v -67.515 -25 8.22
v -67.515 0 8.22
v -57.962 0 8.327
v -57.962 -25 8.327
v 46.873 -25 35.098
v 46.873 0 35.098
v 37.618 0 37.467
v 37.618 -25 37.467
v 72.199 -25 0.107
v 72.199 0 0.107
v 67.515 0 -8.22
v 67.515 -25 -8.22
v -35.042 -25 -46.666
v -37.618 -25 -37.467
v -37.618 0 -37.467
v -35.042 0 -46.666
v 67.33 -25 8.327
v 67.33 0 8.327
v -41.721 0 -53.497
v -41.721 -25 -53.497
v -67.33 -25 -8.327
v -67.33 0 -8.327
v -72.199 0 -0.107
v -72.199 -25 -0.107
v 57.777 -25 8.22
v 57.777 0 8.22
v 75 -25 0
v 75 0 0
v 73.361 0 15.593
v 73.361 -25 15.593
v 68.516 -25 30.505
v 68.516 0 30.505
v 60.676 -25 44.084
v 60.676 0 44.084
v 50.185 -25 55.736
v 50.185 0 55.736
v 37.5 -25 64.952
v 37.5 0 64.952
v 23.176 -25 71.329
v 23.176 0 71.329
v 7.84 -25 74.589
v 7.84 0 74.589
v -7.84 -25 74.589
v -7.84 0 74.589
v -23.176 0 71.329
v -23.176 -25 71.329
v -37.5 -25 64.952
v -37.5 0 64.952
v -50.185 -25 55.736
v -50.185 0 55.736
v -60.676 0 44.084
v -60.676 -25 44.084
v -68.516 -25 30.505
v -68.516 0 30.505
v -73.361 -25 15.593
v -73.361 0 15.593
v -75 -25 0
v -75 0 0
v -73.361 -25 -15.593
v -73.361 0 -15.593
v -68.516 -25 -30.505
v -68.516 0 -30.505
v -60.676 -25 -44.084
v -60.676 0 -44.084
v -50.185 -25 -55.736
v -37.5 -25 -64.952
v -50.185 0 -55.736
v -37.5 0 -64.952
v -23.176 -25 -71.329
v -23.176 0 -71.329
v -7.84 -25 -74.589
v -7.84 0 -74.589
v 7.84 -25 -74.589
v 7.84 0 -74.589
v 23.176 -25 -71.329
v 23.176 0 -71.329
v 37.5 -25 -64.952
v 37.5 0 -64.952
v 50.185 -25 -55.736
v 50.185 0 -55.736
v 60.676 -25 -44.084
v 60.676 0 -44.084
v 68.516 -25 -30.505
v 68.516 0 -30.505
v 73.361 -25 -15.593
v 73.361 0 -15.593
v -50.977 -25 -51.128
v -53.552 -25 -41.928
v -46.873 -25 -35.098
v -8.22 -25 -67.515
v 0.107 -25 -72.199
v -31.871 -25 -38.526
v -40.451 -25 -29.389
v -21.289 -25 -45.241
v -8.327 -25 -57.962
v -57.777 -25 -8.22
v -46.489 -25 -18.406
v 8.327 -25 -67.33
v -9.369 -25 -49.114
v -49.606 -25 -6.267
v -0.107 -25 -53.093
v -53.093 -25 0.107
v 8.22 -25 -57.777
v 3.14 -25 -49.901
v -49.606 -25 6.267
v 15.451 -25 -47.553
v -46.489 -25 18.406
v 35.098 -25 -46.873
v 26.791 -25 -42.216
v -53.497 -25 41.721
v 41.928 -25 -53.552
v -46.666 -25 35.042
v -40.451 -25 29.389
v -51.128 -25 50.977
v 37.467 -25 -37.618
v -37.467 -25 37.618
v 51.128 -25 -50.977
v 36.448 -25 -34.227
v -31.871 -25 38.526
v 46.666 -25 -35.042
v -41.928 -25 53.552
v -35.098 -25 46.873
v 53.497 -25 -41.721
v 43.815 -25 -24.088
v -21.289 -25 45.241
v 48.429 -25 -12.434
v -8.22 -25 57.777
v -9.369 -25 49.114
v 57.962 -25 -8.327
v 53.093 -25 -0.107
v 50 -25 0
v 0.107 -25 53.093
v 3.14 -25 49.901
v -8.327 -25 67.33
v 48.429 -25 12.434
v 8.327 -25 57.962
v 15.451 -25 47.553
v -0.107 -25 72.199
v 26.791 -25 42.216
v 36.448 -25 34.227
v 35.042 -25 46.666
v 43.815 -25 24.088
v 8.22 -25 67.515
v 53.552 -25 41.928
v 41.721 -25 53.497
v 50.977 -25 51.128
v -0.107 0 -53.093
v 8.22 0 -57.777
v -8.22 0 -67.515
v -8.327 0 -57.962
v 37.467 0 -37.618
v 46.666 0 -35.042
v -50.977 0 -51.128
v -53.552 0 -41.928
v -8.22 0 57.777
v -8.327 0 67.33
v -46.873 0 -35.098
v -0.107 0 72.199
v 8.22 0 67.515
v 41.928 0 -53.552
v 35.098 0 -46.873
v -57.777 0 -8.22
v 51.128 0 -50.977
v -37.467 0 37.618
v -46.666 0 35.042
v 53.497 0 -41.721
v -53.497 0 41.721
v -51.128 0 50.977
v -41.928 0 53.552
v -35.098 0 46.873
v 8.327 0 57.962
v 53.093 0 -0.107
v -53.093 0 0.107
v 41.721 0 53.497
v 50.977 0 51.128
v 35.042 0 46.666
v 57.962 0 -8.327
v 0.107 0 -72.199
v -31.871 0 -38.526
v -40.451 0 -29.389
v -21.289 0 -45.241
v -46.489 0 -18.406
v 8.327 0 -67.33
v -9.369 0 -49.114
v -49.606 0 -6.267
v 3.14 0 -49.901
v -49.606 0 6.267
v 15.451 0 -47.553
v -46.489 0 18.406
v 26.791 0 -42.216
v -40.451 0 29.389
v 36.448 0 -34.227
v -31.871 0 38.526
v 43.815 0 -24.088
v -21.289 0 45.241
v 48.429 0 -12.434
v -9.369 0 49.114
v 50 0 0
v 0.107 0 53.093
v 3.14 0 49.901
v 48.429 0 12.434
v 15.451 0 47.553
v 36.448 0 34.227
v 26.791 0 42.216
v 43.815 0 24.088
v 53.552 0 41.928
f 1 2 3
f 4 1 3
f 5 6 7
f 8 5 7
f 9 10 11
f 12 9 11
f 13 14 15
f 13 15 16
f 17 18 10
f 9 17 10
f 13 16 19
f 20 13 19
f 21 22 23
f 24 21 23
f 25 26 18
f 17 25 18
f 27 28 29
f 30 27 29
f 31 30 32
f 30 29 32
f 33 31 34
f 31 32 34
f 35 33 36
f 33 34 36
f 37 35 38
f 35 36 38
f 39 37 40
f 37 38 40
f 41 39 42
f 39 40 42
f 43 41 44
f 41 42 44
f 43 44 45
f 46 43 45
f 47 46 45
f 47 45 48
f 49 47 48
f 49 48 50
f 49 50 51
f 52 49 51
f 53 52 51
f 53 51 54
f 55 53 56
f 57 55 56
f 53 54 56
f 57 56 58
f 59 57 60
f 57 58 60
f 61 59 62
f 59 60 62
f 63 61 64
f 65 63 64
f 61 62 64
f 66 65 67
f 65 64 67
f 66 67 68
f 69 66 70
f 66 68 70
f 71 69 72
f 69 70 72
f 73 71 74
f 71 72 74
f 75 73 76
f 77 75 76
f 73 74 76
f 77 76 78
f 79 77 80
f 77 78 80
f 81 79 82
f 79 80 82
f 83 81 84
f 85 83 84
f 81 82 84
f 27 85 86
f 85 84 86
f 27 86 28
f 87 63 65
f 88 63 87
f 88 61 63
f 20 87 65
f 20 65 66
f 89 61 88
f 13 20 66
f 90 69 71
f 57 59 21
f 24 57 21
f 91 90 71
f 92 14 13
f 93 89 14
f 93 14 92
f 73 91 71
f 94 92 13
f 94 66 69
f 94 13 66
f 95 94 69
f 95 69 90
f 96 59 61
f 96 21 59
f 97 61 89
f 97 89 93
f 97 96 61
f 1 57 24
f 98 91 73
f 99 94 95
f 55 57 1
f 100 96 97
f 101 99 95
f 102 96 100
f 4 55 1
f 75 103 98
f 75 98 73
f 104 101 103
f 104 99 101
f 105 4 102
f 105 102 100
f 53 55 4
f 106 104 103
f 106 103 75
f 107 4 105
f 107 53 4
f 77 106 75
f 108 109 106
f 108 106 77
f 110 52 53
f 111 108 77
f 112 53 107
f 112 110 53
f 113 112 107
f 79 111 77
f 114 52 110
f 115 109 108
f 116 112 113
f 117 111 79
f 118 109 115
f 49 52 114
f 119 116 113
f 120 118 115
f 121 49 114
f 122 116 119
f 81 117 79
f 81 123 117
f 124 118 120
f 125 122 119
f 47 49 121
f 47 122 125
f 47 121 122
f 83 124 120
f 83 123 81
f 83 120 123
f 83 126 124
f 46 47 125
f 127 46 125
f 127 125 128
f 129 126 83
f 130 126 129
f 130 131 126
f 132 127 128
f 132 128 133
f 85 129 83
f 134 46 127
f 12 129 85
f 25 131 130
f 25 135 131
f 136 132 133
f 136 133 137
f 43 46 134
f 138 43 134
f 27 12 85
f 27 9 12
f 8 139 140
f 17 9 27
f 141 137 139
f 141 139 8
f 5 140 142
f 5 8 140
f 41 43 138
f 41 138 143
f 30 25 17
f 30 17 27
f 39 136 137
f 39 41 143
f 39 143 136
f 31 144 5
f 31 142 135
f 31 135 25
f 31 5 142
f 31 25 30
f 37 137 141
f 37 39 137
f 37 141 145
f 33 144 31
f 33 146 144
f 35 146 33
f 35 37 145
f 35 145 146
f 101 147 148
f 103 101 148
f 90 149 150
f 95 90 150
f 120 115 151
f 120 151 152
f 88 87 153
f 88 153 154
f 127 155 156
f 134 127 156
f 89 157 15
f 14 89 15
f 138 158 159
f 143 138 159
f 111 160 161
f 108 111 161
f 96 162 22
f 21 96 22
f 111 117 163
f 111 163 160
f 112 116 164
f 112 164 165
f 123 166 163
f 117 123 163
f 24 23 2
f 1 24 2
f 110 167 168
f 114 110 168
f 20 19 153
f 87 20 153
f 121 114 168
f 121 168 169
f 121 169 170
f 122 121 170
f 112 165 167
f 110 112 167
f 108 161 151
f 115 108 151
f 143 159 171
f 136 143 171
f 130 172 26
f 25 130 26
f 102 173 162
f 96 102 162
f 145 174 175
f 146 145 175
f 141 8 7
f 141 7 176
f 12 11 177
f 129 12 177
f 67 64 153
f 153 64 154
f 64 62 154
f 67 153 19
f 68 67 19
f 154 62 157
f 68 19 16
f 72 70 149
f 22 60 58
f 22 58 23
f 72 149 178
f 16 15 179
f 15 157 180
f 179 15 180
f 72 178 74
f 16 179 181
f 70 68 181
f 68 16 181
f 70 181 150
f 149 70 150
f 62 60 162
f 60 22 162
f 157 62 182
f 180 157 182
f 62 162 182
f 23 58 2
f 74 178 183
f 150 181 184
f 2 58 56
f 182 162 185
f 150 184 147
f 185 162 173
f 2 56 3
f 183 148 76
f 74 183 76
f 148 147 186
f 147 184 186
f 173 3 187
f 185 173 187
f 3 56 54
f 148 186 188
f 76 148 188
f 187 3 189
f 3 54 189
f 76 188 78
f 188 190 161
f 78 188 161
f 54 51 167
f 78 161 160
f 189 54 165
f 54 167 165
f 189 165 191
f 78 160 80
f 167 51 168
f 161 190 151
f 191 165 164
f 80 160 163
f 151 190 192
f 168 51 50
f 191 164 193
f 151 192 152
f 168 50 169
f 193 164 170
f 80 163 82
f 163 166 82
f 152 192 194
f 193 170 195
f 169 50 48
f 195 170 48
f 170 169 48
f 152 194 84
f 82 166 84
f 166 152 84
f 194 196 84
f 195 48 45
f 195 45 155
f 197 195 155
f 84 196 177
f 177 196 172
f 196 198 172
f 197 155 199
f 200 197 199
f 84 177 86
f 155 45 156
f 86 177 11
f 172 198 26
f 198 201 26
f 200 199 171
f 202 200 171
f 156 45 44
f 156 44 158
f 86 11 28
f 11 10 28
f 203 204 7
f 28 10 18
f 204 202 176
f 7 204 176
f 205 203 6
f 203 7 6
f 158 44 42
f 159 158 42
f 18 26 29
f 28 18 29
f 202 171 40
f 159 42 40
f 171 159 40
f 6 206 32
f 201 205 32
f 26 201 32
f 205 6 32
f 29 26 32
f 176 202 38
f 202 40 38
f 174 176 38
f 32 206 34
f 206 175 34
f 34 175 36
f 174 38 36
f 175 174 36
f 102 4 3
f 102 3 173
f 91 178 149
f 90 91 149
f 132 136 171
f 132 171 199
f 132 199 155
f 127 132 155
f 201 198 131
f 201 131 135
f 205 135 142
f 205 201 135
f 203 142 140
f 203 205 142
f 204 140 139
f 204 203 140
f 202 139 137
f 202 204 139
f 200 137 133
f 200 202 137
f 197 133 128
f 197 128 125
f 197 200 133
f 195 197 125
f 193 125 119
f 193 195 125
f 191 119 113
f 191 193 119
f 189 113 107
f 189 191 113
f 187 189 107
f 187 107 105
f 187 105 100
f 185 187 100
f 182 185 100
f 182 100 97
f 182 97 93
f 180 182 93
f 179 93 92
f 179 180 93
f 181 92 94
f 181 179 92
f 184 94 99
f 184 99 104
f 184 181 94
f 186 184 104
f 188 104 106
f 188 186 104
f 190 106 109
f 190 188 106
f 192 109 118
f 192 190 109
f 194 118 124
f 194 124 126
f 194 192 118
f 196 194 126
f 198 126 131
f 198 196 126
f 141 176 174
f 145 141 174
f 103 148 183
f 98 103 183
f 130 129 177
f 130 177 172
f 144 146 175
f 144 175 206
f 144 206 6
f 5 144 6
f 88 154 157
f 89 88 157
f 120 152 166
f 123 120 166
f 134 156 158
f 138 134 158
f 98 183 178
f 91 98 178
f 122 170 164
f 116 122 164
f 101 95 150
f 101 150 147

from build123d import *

# Parameters (mm, degrees)
F0_R     = 75
F0_R_2   = 50
F1_DEPTH = 25


with BuildPart() as f1:
    # F0 (on Front) → F1 (new body)
    with BuildSketch(Plane.XZ):
        Circle(F0_R)
        Polygon((-41.721445, -53.497019), (-50.976545, -51.127983), (-53.552449, -41.928313), (-46.873254, -35.09768), (-37.618154, -37.466716), (-35.04225, -46.666385), align=None, mode=Mode.SUBTRACT)
        Polygon((8.326588, -67.329621), (0.107083, -72.198804), (-8.219505, -67.515095), (-8.326588, -57.962203), (-0.107083, -53.093021), (8.219505, -57.77673), align=None, mode=Mode.SUBTRACT)
        Polygon((53.497019, -41.721445), (51.127983, -50.976545), (41.928313, -53.552449), (35.09768, -46.873254), (37.466716, -37.618154), (46.666385, -35.04225), align=None, mode=Mode.SUBTRACT)
        Polygon((67.329621, 8.326588), (72.198804, 0.107083), (67.515095, -8.219505), (57.962203, -8.326588), (53.093021, -0.107083), (57.77673, 8.219505), align=None, mode=Mode.SUBTRACT)
        Polygon((-67.329621, -8.326588), (-72.198804, -0.107083), (-67.515095, 8.219505), (-57.962203, 8.326588), (-53.093021, 0.107083), (-57.77673, -8.219505), align=None, mode=Mode.SUBTRACT)
        Polygon((-53.497019, 41.721445), (-51.127983, 50.976545), (-41.928313, 53.552449), (-35.09768, 46.873254), (-37.466716, 37.618154), (-46.666385, 35.04225), align=None, mode=Mode.SUBTRACT)
        Circle(F0_R_2, mode=Mode.SUBTRACT)
        Polygon((-8.326588, 67.329621), (-0.107083, 72.198804), (8.219505, 67.515095), (8.326588, 57.962203), (0.107083, 53.093021), (-8.219505, 57.77673), align=None, mode=Mode.SUBTRACT)
        Polygon((41.721445, 53.497019), (50.976545, 51.127983), (53.552449, 41.928313), (46.873254, 35.09768), (37.618154, 37.466716), (35.04225, 46.666385), align=None, mode=Mode.SUBTRACT)
    extrude(amount=F1_DEPTH)


solid = f1.part
